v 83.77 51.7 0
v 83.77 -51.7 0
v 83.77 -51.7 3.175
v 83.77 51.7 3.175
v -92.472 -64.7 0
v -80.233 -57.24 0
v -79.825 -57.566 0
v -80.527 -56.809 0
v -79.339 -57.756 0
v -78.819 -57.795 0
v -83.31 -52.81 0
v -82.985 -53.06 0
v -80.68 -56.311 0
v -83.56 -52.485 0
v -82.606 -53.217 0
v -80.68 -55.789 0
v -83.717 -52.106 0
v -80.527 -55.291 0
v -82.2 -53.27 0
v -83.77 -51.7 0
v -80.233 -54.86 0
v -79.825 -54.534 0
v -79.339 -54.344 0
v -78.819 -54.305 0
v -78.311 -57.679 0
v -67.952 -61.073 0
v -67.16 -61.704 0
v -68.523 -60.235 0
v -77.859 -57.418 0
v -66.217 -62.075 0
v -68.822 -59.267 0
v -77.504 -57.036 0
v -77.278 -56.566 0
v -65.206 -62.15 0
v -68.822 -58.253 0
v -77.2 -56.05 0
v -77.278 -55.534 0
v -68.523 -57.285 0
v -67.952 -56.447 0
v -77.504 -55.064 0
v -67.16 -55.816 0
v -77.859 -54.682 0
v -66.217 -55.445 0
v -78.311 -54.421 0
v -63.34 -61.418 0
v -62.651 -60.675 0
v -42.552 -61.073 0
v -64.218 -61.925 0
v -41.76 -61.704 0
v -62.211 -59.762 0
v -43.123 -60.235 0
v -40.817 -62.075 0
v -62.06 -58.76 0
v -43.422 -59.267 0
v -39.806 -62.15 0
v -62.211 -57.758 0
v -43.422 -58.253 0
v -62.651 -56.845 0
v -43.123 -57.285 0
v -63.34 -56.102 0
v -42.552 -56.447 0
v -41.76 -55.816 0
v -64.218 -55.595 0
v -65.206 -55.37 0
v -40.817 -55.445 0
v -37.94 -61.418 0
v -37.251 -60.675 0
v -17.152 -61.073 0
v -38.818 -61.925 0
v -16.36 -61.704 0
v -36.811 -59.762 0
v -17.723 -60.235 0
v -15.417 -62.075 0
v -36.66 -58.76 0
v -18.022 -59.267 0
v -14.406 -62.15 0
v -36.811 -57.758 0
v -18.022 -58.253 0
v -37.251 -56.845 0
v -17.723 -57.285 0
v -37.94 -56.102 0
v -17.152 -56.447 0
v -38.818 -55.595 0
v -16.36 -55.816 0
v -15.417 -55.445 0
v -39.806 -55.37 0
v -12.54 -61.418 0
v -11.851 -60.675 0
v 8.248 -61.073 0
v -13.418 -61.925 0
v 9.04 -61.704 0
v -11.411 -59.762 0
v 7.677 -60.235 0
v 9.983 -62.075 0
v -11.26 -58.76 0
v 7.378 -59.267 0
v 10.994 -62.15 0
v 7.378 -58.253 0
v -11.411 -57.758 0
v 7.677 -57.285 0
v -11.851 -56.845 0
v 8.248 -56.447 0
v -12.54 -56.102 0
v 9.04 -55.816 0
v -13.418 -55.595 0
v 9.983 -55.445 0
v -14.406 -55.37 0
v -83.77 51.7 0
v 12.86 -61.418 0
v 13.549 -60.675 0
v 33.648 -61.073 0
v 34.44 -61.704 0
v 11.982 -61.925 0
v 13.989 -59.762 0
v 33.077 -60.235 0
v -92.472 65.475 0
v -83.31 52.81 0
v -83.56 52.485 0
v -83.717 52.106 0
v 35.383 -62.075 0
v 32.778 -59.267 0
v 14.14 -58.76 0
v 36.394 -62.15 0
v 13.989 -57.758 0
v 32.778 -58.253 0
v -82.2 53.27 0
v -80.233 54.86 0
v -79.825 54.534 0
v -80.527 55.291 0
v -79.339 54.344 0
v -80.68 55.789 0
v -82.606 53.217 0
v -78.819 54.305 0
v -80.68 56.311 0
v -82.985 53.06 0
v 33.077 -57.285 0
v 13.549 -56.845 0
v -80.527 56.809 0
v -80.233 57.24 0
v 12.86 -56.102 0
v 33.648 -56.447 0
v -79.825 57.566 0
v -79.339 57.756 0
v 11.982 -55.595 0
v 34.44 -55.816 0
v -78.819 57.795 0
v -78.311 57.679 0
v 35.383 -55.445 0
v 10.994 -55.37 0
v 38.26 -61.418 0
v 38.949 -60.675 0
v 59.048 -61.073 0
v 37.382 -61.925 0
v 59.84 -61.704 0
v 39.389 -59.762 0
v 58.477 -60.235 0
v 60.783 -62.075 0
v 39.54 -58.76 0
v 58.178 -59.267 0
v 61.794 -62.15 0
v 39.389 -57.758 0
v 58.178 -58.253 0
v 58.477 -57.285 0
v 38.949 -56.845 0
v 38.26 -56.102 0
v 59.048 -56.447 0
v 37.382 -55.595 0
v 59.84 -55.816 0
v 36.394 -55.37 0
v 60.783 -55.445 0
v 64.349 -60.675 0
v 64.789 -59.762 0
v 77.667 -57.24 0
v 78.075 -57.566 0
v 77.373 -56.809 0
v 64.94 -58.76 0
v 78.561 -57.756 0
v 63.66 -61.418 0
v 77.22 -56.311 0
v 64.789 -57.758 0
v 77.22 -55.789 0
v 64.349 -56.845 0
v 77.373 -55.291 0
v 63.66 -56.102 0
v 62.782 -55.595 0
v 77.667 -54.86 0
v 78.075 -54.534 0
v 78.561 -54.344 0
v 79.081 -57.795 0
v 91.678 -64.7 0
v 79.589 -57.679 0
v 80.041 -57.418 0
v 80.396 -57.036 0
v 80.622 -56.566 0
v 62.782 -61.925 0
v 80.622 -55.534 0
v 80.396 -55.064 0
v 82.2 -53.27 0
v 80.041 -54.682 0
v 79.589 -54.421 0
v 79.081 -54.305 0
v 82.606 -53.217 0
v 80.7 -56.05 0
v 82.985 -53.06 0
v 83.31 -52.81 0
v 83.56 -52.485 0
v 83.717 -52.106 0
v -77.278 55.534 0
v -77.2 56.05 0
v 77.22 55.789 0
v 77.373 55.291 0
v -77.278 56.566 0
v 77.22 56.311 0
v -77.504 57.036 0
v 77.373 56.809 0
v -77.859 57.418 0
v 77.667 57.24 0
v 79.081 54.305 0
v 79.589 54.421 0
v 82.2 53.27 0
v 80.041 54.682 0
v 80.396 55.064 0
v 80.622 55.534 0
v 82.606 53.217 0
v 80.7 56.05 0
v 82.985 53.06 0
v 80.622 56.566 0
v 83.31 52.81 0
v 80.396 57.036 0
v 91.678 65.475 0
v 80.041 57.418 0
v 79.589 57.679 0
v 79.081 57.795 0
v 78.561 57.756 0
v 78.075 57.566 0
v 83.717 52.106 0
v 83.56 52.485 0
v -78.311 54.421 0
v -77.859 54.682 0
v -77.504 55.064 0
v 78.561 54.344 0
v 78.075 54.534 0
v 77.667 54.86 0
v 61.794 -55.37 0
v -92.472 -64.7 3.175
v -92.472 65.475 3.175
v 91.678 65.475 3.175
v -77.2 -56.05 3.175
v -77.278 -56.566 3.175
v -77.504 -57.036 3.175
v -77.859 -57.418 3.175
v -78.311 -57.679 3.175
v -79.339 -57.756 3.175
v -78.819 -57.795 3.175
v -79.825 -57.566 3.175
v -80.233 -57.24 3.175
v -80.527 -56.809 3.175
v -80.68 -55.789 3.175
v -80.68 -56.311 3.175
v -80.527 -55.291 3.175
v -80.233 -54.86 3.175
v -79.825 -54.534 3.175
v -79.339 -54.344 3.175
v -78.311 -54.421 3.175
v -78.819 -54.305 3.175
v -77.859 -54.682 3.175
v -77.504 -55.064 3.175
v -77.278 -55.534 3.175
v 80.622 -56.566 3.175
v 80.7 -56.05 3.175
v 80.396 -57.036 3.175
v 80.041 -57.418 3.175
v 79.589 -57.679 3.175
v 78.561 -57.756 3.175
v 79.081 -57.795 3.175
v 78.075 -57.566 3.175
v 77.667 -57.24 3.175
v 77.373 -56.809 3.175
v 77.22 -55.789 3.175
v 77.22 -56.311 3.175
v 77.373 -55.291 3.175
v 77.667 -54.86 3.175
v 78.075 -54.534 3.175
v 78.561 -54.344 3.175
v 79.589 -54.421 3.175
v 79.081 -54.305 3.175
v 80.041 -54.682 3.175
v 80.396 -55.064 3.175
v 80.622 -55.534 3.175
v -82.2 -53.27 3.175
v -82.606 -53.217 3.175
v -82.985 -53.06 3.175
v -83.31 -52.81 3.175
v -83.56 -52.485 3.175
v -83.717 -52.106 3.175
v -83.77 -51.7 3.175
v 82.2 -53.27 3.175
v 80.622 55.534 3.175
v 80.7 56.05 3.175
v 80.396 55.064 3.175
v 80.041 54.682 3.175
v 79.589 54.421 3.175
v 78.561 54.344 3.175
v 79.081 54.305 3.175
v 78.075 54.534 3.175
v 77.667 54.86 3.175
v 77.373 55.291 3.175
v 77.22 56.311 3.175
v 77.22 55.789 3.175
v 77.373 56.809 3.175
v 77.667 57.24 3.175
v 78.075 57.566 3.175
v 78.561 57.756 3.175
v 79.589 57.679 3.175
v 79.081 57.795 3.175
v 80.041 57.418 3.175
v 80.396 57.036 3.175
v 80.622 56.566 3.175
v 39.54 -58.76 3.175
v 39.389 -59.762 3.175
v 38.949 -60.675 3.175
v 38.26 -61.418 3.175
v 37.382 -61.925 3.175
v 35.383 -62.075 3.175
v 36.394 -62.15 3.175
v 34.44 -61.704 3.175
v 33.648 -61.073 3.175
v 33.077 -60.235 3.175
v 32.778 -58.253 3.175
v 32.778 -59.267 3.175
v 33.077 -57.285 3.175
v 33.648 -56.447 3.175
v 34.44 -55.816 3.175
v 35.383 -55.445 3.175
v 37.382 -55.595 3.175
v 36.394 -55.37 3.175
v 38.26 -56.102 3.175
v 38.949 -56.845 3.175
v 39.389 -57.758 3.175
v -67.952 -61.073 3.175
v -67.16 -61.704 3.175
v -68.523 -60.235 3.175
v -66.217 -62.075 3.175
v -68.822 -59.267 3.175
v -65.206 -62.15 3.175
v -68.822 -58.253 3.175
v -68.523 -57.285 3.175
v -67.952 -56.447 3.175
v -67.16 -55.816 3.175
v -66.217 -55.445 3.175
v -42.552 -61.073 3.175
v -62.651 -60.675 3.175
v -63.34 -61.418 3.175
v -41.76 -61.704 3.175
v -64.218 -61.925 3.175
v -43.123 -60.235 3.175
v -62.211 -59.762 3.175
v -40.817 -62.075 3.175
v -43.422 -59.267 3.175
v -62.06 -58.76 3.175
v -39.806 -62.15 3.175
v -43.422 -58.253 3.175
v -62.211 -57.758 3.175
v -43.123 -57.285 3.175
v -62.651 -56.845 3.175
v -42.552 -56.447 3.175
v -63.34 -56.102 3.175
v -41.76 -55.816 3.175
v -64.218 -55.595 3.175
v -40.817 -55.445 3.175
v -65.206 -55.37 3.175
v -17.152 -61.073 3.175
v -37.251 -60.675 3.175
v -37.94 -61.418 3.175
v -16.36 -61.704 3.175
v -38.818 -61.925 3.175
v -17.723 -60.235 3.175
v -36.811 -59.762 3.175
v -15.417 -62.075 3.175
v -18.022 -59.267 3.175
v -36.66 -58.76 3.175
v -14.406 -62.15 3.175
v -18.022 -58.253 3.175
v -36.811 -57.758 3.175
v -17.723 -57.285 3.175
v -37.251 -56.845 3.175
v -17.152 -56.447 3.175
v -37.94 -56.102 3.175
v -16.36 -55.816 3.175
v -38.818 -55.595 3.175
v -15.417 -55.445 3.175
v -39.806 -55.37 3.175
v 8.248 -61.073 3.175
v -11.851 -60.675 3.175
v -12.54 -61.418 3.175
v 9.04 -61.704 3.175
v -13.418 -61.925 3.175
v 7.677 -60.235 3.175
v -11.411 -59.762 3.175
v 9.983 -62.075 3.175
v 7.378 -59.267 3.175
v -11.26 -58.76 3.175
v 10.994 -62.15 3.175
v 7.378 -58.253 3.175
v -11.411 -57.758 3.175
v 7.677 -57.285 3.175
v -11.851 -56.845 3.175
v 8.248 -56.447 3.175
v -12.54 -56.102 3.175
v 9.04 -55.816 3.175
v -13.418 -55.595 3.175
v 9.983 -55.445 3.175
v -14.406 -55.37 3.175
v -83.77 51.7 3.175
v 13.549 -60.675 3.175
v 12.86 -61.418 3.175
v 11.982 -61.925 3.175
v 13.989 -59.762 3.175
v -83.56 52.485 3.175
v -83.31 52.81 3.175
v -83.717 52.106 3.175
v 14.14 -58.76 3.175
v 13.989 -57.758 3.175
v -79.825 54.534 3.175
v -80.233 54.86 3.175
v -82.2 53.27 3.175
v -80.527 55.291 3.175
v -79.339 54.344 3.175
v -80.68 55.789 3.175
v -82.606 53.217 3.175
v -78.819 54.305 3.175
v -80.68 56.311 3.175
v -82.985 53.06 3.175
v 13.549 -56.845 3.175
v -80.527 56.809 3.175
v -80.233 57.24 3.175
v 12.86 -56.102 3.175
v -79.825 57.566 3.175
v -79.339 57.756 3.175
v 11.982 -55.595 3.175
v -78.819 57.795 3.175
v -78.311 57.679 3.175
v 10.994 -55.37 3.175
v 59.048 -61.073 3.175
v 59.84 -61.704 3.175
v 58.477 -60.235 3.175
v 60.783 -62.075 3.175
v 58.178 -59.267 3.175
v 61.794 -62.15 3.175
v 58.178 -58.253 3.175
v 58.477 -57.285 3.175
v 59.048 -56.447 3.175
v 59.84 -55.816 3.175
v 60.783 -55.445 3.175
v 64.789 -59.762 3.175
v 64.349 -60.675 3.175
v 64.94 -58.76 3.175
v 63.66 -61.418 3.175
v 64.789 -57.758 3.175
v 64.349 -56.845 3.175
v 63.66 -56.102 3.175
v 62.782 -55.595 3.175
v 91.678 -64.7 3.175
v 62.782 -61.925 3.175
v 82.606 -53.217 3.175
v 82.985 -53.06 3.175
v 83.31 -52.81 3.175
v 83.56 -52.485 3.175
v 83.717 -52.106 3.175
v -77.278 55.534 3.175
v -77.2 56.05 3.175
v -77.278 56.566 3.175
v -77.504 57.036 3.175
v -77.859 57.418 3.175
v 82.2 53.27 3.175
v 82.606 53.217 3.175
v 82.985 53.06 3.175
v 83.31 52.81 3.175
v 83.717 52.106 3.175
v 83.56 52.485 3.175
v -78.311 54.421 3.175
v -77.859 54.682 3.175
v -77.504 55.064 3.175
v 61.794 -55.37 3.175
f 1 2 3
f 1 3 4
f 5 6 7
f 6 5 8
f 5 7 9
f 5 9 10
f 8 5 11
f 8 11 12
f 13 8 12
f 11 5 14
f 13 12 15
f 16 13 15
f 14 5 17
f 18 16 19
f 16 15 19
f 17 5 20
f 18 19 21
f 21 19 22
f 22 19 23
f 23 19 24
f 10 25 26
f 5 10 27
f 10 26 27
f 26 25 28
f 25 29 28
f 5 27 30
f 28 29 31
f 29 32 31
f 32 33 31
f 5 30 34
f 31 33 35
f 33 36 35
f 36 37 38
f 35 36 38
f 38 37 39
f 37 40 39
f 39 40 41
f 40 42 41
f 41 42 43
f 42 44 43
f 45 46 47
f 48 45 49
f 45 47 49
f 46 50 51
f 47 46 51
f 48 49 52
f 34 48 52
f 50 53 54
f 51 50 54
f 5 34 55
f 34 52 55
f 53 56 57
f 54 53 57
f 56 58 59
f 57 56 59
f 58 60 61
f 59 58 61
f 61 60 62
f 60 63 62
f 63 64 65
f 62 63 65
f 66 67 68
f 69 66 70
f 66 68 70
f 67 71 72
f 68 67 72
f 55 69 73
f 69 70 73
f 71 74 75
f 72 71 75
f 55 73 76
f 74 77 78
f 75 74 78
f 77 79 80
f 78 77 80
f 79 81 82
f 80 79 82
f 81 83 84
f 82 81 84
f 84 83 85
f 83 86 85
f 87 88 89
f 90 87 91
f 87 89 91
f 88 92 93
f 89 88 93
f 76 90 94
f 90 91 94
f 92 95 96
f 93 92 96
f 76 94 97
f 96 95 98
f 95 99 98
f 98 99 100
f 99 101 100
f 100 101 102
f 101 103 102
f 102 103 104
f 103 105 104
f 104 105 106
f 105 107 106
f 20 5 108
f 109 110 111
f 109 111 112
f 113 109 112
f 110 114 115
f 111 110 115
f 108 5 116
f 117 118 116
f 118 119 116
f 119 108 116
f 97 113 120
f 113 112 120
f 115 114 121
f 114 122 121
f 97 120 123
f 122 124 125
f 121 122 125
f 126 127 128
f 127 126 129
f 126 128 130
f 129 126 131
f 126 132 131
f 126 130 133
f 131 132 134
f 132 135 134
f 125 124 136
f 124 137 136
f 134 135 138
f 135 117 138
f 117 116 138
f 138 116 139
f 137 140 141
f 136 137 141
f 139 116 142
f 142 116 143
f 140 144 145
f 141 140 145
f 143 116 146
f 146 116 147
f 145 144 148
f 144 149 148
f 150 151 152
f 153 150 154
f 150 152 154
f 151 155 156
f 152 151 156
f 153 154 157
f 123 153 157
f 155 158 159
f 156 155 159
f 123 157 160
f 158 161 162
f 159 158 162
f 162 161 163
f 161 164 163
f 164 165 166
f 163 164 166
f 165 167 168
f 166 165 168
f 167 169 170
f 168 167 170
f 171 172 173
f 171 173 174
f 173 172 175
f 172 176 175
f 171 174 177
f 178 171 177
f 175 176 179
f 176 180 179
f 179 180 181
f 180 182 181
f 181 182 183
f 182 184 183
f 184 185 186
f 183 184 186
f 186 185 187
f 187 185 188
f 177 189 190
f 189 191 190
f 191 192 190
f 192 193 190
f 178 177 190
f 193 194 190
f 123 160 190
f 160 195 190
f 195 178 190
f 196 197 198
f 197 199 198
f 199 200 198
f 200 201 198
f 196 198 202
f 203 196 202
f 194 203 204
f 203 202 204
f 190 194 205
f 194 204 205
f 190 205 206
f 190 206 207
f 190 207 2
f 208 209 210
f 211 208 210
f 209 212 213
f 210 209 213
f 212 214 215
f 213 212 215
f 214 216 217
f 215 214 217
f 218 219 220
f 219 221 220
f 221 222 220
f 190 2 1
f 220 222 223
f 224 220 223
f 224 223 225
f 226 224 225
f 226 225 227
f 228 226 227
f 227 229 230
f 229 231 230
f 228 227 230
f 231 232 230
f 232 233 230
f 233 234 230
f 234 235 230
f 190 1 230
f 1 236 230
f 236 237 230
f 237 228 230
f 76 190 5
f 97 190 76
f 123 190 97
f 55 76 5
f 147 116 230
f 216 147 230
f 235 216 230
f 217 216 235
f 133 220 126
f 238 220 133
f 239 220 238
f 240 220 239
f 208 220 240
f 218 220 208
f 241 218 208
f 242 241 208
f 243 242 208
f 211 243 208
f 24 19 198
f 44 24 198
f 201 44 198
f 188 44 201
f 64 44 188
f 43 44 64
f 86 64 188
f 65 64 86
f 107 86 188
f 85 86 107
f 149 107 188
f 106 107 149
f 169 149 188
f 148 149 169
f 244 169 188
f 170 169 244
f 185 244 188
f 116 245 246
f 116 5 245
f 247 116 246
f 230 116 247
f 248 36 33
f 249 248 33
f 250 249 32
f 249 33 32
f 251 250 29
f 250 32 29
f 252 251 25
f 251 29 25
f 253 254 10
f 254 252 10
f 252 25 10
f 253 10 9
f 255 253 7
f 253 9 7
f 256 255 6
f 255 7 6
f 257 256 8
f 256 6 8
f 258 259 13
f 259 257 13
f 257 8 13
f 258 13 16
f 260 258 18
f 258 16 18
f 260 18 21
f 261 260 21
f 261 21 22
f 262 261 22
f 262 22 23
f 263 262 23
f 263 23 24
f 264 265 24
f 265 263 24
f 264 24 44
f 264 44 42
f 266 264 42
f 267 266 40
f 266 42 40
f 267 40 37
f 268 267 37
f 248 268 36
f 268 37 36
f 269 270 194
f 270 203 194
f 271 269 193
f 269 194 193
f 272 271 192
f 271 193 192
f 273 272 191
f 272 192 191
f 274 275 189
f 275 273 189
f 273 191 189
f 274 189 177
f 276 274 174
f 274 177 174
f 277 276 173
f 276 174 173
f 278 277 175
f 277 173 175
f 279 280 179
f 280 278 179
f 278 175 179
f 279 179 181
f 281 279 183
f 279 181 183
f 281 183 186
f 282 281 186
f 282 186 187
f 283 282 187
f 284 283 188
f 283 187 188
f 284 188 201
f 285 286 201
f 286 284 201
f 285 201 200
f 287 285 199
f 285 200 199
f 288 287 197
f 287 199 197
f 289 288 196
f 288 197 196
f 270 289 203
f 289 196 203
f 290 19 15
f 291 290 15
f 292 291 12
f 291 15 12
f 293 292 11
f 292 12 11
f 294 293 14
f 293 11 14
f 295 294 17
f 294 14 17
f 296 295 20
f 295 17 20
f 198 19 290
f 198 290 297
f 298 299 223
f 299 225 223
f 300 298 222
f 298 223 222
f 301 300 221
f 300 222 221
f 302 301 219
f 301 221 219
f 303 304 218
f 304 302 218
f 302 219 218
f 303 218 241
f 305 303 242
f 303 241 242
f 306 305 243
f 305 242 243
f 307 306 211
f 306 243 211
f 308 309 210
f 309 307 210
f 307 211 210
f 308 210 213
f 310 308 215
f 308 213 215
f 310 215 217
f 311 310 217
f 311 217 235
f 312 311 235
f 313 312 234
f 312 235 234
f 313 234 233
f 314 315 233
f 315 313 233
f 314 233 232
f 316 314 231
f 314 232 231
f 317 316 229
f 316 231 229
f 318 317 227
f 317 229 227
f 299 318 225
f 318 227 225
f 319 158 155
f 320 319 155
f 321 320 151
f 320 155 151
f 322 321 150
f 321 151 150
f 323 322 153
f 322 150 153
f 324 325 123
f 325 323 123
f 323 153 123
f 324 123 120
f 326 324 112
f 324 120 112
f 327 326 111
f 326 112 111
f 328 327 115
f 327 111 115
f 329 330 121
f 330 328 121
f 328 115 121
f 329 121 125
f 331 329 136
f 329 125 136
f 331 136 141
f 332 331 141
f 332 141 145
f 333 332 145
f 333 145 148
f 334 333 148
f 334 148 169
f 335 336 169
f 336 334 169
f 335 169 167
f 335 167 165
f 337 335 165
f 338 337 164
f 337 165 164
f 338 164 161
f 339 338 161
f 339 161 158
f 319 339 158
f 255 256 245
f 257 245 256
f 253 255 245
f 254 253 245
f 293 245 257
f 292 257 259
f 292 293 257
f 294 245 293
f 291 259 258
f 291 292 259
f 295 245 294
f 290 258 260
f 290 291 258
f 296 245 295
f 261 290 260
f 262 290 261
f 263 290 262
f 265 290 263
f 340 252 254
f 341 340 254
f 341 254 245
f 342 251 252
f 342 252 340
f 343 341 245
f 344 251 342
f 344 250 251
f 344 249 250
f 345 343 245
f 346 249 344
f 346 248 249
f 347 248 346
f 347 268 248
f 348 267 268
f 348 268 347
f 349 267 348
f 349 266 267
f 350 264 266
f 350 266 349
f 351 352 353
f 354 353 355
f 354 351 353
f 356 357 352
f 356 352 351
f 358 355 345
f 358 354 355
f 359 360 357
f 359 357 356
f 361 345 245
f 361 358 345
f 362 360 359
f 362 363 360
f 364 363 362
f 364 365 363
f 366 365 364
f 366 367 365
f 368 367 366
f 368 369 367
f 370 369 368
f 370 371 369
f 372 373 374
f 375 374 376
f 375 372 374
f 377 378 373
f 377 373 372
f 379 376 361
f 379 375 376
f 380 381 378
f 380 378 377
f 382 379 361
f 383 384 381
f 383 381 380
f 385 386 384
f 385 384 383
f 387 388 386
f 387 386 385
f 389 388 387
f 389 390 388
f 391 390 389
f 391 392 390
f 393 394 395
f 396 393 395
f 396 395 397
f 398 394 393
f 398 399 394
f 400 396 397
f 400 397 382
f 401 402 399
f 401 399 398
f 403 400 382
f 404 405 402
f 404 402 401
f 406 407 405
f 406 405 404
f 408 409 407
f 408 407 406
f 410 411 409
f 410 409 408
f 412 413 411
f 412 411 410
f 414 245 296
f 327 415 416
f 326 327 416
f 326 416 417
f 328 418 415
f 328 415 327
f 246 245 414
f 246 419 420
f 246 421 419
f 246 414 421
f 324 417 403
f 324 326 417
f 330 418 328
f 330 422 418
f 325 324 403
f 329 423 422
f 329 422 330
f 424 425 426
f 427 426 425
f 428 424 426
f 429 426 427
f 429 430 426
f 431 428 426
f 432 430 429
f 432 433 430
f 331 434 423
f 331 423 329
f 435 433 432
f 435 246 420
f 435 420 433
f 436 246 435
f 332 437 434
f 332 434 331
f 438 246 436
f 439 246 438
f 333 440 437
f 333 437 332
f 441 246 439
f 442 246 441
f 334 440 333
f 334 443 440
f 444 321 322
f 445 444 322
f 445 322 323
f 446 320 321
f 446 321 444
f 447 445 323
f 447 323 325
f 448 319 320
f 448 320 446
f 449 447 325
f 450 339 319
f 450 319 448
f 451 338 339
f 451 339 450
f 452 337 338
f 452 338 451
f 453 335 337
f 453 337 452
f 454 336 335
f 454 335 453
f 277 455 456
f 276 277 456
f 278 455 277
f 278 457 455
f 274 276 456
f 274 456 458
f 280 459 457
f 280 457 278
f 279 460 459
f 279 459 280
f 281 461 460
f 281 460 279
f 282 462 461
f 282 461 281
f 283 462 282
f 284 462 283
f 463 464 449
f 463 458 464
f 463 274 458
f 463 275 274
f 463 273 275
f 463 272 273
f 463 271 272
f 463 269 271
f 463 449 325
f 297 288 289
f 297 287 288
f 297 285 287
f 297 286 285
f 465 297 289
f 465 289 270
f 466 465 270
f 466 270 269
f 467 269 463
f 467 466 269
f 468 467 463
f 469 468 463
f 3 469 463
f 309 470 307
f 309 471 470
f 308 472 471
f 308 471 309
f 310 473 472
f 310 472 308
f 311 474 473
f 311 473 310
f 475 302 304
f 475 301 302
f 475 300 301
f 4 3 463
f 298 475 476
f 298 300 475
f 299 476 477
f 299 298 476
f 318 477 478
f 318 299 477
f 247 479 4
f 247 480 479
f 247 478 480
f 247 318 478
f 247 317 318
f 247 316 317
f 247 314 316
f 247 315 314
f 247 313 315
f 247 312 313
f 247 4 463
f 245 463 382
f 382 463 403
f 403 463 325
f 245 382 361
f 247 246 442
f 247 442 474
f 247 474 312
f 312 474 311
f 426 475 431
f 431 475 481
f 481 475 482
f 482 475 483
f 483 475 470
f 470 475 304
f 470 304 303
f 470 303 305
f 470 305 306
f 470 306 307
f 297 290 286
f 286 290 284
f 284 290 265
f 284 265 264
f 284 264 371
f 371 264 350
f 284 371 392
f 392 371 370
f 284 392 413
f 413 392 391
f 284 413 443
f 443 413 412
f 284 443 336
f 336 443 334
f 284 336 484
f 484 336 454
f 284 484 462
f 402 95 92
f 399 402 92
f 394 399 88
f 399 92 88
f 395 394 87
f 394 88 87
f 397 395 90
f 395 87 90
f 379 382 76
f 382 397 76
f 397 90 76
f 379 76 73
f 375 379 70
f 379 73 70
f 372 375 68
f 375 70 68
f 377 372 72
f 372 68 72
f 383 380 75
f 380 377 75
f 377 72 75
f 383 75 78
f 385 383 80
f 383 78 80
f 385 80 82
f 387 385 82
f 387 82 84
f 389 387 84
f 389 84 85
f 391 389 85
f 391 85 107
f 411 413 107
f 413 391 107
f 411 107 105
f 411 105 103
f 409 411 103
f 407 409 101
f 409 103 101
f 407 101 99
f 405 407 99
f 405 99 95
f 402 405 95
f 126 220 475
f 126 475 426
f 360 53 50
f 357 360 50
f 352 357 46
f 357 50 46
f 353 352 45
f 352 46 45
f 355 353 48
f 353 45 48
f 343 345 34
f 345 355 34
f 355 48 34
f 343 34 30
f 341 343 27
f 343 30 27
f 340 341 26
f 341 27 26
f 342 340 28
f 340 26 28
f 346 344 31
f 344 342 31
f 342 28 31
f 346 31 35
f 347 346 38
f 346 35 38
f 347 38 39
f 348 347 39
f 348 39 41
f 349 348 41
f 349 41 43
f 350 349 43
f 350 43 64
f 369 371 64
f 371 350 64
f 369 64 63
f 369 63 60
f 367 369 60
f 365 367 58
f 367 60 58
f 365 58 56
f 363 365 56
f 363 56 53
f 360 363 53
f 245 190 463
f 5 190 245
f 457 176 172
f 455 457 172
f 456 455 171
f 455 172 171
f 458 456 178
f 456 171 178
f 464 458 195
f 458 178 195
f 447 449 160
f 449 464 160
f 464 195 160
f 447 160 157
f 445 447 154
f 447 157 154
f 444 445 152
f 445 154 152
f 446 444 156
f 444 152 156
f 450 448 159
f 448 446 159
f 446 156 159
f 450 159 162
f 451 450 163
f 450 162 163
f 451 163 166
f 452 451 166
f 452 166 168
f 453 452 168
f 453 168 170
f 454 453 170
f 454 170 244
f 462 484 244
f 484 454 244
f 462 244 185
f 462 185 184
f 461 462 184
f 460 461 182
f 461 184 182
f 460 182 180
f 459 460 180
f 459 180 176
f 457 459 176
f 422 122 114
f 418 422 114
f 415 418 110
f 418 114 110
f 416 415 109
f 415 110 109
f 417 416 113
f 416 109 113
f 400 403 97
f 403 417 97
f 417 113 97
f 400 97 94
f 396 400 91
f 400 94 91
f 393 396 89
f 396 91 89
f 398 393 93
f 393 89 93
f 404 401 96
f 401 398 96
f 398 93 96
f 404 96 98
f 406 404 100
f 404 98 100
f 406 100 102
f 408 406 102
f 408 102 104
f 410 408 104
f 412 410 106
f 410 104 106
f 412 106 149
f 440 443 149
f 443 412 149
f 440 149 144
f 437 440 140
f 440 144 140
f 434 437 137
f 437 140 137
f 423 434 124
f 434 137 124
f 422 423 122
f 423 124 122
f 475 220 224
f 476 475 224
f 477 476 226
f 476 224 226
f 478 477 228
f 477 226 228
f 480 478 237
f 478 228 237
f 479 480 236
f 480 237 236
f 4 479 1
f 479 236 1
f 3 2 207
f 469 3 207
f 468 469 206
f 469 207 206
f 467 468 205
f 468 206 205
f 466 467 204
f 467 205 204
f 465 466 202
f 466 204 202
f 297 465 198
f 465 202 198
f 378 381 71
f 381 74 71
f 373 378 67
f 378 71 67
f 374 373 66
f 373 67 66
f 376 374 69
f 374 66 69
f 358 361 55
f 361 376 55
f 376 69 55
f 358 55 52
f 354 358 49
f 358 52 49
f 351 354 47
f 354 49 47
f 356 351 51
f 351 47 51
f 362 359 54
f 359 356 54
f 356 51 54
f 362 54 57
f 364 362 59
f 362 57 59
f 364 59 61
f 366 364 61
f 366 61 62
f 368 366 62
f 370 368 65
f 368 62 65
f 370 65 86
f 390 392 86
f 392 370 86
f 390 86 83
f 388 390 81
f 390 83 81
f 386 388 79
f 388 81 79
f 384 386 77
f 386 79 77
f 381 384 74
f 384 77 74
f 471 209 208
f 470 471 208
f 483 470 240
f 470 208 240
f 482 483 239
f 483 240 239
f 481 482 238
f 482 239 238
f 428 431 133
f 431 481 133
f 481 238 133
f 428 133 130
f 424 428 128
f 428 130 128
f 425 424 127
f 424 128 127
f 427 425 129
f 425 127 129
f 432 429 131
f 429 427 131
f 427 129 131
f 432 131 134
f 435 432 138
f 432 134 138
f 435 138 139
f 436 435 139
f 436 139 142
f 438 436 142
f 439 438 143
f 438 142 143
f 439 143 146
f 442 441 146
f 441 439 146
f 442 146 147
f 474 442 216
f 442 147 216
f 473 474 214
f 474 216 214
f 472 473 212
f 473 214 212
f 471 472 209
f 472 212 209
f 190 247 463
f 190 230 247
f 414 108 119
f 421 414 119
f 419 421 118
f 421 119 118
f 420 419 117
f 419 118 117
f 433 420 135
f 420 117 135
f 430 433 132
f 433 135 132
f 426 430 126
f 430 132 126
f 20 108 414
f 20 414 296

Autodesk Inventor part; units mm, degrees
ref_plane "YZ Plane" through (0, 0, 0) normal (1, 0, 0) x (0, 1, 0)
ref_plane "Work Plane1" through (-82.5, -59.605, 0) normal (0, 0, 1) x (1, 0, 0)
sketch "Sketch1" plane through (0, 0, 0) normal (0, 0, 1) x (1, 0, 0)
  circle A0 centre (-78.95, -56.05) radius 1.75 projected
  circle A1 centre (78.95, -56.05) radius 1.75 projected
  circle A2 centre (78.95, 56.05) radius 1.75 projected
  circle A3 centre (-78.95, 56.05) radius 1.75 projected
  line L0 (-92.4724, 65.475) -> (91.6776, 65.475)
  line L1 (91.6776, 65.475) -> (91.6776, -64.7)
  line L2 (91.6776, -64.7) -> (-92.4724, -64.7)
  line L3 (-92.4724, -64.7) -> (-92.4724, 65.475)
  line L4 (-80.31, 46.61) -> (76.39, 46.61) construction
  line L5 (-80.31, -42.49) -> (-80.31, 46.61) construction
  line L6 (76.39, -42.49) -> (-80.31, -42.49) construction
  line L7 (76.39, 46.61) -> (76.39, -42.49) construction
  line L8 (-55.7212, -9.8482) -> (100.3438, -9.8482) construction
  line L9 (-82.2, -52) -> (82.2, -52) construction
  line L10 (-82.2, -52) -> (82.2, -52) construction
  circle A4 centre (-65.46, -58.76) radius 3.4
  circle A5 centre (-40.06, -58.76) radius 3.4
  circle A6 centre (-14.66, -58.76) radius 3.4
  circle A7 centre (10.74, -58.76) radius 3.4
  circle A8 centre (36.14, -58.76) radius 3.4
  circle A9 centre (61.54, -58.76) radius 3.4
  line L11 (82.5, -51.7) -> (82.5, 51.7) projected
  line L12 (82.2, 52) -> (-82.2, 52) projected
  line L13 (-82.5, 51.7) -> (-82.5, -51.7) projected
  line L14 (-82.2, -52) -> (82.2, -52) projected
  arc A10 (-82.2, 52) -> (-82.5, 51.7) centre (-82.2, 51.7) ccw projected
  arc A11 (82.5, 51.7) -> (82.2, 52) centre (82.2, 51.7) ccw projected
  arc A12 (82.2, -52) -> (82.5, -51.7) centre (82.2, -51.7) ccw projected
  arc A13 (-82.5, -51.7) -> (-82.2, -52) centre (-82.2, -51.7) ccw projected
  line L15 (-82.2, -53.27) -> (82.2, -53.27)
  arc A14 (82.2, -53.27) -> (83.77, -51.7) centre (82.2, -51.7) ccw
  line L16 (83.77, -51.7) -> (83.77, 51.7)
  arc A15 (83.77, 51.7) -> (82.2, 53.27) centre (82.2, 51.7) ccw
  line L17 (82.2, 53.27) -> (-82.2, 53.27)
  arc A16 (-82.2, 53.27) -> (-83.77, 51.7) centre (-82.2, 51.7) ccw
  line L18 (-83.77, 51.7) -> (-83.77, -51.7)
  arc A17 (-83.77, -51.7) -> (-82.2, -53.27) centre (-82.2, -51.7) ccw
  point P0 (-0.3974, -64.7)
  point P1 (-1.96, 65.475)
  dimension "d1" = 130.175
  dimension "d2" = 184.15
  dimension "d3" = 12.7
  dimension "d4" = 6.8
  dimension "d7" = 25.4
  dimension "d18" = 1.27
ref_plane "Work Plane2" through (-82.5, -59.605, 0) normal (0, 0, 1) x (1, 0, 0)
extrude "Extrusion2" add sketch "Sketch1" along normal blind 3.175 from surface at 0 contours L0 L1 L2 L3
properties part number "Center Bezel"
